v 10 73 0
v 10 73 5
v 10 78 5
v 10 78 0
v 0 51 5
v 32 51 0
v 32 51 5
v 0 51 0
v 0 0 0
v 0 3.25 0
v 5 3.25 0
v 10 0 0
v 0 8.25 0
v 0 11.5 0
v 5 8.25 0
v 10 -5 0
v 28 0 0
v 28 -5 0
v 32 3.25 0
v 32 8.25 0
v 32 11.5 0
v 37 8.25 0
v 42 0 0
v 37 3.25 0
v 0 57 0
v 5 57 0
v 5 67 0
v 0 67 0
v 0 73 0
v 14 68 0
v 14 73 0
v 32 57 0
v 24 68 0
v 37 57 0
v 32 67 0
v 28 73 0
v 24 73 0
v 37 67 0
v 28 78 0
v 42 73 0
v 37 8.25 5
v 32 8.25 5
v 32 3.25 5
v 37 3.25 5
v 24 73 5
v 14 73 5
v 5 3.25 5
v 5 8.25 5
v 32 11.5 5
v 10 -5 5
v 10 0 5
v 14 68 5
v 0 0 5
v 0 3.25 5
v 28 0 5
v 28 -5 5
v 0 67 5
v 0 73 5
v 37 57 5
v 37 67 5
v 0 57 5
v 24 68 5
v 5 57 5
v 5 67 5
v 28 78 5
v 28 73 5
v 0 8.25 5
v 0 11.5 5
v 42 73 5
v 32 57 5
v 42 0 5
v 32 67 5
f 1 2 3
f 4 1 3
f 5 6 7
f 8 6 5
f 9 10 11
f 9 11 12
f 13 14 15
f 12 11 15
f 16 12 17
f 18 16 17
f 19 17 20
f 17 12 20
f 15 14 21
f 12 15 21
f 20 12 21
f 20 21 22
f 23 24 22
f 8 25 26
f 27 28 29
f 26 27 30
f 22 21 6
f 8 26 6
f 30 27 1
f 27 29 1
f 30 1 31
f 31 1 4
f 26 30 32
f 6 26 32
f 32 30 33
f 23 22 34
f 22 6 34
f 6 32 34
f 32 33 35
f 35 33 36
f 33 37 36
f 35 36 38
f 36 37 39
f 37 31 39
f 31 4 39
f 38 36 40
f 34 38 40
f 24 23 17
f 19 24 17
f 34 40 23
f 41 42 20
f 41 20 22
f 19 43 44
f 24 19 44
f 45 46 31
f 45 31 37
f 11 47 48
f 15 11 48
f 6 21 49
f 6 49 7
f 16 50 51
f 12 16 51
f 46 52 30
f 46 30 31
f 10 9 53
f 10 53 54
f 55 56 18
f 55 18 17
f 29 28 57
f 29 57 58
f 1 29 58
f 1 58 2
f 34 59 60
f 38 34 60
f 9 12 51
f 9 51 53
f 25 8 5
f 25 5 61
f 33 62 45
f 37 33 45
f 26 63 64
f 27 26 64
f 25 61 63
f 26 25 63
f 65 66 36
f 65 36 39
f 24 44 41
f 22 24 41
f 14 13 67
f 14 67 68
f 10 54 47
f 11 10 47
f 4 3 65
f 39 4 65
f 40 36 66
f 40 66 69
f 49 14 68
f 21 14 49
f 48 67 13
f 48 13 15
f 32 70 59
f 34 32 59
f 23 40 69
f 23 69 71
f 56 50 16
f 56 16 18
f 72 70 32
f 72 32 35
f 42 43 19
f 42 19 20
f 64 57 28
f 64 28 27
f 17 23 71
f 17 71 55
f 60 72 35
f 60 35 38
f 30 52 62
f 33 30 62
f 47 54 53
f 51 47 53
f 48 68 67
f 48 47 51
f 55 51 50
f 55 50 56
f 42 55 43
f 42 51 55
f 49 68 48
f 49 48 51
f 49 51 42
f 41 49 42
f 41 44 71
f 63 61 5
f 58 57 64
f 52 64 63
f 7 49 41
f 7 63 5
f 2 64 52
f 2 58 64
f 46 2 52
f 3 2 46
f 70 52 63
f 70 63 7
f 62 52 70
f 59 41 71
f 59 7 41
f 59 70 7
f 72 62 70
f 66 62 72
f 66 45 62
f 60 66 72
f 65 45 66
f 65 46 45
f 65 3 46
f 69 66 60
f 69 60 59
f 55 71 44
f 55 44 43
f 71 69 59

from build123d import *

# Parameters (mm, degrees)
BOSS_EXTRU_1_DEPTH      = 5
ESQUISSE2_W             = 5
ESQUISSE2_H             = 10
ESQUISSE2_H_2           = 5
ESQUISSE2_W_2           = 10
ENL_V_MAT_EXTRU_1_DEPTH = 5
ESQUISSE3_W             = 18
ESQUISSE3_H             = 5
BOSS_EXTRU_2_DEPTH      = 5


with BuildPart() as part:
    # Esquisse1 → Boss.-Extru.1 (new body)
    with BuildSketch(Plane.XY):
        Polygon((0, 73), (42, 73), (42, 0), (0, 0), (0, 11.5), (32, 11.5), (32, 51), (0, 51), align=None)
    extrude(amount=BOSS_EXTRU_1_DEPTH)

    # Esquisse2 → Enlèv. mat.-Extru.1 (cut)
    with BuildSketch(Plane.XY.offset(5)):
        with Locations((2.5, 62)):
            Rectangle(ESQUISSE2_W, ESQUISSE2_H)
        with Locations((2.5, 5.75)):
            Rectangle(ESQUISSE2_W, ESQUISSE2_H_2)
        with Locations((34.5, 62)):
            Rectangle(ESQUISSE2_W, ESQUISSE2_H)
        with Locations((34.5, 5.75)):
            Rectangle(ESQUISSE2_W, ESQUISSE2_H_2)
        with Locations((19, 70.5)):
            Rectangle(ESQUISSE2_W_2, ESQUISSE2_H_2)
    extrude(amount=-ENL_V_MAT_EXTRU_1_DEPTH, mode=Mode.SUBTRACT)

    # Esquisse3 → Boss.-Extru.2 (add)
    with BuildSketch(Plane.XY.offset(5)):
        with Locations((19, 75.5)):
            Rectangle(ESQUISSE3_W, ESQUISSE3_H)
        with Locations((19, -2.5)):
            Rectangle(ESQUISSE3_W, ESQUISSE3_H)
    extrude(amount=-BOSS_EXTRU_2_DEPTH)


solid = part.part
